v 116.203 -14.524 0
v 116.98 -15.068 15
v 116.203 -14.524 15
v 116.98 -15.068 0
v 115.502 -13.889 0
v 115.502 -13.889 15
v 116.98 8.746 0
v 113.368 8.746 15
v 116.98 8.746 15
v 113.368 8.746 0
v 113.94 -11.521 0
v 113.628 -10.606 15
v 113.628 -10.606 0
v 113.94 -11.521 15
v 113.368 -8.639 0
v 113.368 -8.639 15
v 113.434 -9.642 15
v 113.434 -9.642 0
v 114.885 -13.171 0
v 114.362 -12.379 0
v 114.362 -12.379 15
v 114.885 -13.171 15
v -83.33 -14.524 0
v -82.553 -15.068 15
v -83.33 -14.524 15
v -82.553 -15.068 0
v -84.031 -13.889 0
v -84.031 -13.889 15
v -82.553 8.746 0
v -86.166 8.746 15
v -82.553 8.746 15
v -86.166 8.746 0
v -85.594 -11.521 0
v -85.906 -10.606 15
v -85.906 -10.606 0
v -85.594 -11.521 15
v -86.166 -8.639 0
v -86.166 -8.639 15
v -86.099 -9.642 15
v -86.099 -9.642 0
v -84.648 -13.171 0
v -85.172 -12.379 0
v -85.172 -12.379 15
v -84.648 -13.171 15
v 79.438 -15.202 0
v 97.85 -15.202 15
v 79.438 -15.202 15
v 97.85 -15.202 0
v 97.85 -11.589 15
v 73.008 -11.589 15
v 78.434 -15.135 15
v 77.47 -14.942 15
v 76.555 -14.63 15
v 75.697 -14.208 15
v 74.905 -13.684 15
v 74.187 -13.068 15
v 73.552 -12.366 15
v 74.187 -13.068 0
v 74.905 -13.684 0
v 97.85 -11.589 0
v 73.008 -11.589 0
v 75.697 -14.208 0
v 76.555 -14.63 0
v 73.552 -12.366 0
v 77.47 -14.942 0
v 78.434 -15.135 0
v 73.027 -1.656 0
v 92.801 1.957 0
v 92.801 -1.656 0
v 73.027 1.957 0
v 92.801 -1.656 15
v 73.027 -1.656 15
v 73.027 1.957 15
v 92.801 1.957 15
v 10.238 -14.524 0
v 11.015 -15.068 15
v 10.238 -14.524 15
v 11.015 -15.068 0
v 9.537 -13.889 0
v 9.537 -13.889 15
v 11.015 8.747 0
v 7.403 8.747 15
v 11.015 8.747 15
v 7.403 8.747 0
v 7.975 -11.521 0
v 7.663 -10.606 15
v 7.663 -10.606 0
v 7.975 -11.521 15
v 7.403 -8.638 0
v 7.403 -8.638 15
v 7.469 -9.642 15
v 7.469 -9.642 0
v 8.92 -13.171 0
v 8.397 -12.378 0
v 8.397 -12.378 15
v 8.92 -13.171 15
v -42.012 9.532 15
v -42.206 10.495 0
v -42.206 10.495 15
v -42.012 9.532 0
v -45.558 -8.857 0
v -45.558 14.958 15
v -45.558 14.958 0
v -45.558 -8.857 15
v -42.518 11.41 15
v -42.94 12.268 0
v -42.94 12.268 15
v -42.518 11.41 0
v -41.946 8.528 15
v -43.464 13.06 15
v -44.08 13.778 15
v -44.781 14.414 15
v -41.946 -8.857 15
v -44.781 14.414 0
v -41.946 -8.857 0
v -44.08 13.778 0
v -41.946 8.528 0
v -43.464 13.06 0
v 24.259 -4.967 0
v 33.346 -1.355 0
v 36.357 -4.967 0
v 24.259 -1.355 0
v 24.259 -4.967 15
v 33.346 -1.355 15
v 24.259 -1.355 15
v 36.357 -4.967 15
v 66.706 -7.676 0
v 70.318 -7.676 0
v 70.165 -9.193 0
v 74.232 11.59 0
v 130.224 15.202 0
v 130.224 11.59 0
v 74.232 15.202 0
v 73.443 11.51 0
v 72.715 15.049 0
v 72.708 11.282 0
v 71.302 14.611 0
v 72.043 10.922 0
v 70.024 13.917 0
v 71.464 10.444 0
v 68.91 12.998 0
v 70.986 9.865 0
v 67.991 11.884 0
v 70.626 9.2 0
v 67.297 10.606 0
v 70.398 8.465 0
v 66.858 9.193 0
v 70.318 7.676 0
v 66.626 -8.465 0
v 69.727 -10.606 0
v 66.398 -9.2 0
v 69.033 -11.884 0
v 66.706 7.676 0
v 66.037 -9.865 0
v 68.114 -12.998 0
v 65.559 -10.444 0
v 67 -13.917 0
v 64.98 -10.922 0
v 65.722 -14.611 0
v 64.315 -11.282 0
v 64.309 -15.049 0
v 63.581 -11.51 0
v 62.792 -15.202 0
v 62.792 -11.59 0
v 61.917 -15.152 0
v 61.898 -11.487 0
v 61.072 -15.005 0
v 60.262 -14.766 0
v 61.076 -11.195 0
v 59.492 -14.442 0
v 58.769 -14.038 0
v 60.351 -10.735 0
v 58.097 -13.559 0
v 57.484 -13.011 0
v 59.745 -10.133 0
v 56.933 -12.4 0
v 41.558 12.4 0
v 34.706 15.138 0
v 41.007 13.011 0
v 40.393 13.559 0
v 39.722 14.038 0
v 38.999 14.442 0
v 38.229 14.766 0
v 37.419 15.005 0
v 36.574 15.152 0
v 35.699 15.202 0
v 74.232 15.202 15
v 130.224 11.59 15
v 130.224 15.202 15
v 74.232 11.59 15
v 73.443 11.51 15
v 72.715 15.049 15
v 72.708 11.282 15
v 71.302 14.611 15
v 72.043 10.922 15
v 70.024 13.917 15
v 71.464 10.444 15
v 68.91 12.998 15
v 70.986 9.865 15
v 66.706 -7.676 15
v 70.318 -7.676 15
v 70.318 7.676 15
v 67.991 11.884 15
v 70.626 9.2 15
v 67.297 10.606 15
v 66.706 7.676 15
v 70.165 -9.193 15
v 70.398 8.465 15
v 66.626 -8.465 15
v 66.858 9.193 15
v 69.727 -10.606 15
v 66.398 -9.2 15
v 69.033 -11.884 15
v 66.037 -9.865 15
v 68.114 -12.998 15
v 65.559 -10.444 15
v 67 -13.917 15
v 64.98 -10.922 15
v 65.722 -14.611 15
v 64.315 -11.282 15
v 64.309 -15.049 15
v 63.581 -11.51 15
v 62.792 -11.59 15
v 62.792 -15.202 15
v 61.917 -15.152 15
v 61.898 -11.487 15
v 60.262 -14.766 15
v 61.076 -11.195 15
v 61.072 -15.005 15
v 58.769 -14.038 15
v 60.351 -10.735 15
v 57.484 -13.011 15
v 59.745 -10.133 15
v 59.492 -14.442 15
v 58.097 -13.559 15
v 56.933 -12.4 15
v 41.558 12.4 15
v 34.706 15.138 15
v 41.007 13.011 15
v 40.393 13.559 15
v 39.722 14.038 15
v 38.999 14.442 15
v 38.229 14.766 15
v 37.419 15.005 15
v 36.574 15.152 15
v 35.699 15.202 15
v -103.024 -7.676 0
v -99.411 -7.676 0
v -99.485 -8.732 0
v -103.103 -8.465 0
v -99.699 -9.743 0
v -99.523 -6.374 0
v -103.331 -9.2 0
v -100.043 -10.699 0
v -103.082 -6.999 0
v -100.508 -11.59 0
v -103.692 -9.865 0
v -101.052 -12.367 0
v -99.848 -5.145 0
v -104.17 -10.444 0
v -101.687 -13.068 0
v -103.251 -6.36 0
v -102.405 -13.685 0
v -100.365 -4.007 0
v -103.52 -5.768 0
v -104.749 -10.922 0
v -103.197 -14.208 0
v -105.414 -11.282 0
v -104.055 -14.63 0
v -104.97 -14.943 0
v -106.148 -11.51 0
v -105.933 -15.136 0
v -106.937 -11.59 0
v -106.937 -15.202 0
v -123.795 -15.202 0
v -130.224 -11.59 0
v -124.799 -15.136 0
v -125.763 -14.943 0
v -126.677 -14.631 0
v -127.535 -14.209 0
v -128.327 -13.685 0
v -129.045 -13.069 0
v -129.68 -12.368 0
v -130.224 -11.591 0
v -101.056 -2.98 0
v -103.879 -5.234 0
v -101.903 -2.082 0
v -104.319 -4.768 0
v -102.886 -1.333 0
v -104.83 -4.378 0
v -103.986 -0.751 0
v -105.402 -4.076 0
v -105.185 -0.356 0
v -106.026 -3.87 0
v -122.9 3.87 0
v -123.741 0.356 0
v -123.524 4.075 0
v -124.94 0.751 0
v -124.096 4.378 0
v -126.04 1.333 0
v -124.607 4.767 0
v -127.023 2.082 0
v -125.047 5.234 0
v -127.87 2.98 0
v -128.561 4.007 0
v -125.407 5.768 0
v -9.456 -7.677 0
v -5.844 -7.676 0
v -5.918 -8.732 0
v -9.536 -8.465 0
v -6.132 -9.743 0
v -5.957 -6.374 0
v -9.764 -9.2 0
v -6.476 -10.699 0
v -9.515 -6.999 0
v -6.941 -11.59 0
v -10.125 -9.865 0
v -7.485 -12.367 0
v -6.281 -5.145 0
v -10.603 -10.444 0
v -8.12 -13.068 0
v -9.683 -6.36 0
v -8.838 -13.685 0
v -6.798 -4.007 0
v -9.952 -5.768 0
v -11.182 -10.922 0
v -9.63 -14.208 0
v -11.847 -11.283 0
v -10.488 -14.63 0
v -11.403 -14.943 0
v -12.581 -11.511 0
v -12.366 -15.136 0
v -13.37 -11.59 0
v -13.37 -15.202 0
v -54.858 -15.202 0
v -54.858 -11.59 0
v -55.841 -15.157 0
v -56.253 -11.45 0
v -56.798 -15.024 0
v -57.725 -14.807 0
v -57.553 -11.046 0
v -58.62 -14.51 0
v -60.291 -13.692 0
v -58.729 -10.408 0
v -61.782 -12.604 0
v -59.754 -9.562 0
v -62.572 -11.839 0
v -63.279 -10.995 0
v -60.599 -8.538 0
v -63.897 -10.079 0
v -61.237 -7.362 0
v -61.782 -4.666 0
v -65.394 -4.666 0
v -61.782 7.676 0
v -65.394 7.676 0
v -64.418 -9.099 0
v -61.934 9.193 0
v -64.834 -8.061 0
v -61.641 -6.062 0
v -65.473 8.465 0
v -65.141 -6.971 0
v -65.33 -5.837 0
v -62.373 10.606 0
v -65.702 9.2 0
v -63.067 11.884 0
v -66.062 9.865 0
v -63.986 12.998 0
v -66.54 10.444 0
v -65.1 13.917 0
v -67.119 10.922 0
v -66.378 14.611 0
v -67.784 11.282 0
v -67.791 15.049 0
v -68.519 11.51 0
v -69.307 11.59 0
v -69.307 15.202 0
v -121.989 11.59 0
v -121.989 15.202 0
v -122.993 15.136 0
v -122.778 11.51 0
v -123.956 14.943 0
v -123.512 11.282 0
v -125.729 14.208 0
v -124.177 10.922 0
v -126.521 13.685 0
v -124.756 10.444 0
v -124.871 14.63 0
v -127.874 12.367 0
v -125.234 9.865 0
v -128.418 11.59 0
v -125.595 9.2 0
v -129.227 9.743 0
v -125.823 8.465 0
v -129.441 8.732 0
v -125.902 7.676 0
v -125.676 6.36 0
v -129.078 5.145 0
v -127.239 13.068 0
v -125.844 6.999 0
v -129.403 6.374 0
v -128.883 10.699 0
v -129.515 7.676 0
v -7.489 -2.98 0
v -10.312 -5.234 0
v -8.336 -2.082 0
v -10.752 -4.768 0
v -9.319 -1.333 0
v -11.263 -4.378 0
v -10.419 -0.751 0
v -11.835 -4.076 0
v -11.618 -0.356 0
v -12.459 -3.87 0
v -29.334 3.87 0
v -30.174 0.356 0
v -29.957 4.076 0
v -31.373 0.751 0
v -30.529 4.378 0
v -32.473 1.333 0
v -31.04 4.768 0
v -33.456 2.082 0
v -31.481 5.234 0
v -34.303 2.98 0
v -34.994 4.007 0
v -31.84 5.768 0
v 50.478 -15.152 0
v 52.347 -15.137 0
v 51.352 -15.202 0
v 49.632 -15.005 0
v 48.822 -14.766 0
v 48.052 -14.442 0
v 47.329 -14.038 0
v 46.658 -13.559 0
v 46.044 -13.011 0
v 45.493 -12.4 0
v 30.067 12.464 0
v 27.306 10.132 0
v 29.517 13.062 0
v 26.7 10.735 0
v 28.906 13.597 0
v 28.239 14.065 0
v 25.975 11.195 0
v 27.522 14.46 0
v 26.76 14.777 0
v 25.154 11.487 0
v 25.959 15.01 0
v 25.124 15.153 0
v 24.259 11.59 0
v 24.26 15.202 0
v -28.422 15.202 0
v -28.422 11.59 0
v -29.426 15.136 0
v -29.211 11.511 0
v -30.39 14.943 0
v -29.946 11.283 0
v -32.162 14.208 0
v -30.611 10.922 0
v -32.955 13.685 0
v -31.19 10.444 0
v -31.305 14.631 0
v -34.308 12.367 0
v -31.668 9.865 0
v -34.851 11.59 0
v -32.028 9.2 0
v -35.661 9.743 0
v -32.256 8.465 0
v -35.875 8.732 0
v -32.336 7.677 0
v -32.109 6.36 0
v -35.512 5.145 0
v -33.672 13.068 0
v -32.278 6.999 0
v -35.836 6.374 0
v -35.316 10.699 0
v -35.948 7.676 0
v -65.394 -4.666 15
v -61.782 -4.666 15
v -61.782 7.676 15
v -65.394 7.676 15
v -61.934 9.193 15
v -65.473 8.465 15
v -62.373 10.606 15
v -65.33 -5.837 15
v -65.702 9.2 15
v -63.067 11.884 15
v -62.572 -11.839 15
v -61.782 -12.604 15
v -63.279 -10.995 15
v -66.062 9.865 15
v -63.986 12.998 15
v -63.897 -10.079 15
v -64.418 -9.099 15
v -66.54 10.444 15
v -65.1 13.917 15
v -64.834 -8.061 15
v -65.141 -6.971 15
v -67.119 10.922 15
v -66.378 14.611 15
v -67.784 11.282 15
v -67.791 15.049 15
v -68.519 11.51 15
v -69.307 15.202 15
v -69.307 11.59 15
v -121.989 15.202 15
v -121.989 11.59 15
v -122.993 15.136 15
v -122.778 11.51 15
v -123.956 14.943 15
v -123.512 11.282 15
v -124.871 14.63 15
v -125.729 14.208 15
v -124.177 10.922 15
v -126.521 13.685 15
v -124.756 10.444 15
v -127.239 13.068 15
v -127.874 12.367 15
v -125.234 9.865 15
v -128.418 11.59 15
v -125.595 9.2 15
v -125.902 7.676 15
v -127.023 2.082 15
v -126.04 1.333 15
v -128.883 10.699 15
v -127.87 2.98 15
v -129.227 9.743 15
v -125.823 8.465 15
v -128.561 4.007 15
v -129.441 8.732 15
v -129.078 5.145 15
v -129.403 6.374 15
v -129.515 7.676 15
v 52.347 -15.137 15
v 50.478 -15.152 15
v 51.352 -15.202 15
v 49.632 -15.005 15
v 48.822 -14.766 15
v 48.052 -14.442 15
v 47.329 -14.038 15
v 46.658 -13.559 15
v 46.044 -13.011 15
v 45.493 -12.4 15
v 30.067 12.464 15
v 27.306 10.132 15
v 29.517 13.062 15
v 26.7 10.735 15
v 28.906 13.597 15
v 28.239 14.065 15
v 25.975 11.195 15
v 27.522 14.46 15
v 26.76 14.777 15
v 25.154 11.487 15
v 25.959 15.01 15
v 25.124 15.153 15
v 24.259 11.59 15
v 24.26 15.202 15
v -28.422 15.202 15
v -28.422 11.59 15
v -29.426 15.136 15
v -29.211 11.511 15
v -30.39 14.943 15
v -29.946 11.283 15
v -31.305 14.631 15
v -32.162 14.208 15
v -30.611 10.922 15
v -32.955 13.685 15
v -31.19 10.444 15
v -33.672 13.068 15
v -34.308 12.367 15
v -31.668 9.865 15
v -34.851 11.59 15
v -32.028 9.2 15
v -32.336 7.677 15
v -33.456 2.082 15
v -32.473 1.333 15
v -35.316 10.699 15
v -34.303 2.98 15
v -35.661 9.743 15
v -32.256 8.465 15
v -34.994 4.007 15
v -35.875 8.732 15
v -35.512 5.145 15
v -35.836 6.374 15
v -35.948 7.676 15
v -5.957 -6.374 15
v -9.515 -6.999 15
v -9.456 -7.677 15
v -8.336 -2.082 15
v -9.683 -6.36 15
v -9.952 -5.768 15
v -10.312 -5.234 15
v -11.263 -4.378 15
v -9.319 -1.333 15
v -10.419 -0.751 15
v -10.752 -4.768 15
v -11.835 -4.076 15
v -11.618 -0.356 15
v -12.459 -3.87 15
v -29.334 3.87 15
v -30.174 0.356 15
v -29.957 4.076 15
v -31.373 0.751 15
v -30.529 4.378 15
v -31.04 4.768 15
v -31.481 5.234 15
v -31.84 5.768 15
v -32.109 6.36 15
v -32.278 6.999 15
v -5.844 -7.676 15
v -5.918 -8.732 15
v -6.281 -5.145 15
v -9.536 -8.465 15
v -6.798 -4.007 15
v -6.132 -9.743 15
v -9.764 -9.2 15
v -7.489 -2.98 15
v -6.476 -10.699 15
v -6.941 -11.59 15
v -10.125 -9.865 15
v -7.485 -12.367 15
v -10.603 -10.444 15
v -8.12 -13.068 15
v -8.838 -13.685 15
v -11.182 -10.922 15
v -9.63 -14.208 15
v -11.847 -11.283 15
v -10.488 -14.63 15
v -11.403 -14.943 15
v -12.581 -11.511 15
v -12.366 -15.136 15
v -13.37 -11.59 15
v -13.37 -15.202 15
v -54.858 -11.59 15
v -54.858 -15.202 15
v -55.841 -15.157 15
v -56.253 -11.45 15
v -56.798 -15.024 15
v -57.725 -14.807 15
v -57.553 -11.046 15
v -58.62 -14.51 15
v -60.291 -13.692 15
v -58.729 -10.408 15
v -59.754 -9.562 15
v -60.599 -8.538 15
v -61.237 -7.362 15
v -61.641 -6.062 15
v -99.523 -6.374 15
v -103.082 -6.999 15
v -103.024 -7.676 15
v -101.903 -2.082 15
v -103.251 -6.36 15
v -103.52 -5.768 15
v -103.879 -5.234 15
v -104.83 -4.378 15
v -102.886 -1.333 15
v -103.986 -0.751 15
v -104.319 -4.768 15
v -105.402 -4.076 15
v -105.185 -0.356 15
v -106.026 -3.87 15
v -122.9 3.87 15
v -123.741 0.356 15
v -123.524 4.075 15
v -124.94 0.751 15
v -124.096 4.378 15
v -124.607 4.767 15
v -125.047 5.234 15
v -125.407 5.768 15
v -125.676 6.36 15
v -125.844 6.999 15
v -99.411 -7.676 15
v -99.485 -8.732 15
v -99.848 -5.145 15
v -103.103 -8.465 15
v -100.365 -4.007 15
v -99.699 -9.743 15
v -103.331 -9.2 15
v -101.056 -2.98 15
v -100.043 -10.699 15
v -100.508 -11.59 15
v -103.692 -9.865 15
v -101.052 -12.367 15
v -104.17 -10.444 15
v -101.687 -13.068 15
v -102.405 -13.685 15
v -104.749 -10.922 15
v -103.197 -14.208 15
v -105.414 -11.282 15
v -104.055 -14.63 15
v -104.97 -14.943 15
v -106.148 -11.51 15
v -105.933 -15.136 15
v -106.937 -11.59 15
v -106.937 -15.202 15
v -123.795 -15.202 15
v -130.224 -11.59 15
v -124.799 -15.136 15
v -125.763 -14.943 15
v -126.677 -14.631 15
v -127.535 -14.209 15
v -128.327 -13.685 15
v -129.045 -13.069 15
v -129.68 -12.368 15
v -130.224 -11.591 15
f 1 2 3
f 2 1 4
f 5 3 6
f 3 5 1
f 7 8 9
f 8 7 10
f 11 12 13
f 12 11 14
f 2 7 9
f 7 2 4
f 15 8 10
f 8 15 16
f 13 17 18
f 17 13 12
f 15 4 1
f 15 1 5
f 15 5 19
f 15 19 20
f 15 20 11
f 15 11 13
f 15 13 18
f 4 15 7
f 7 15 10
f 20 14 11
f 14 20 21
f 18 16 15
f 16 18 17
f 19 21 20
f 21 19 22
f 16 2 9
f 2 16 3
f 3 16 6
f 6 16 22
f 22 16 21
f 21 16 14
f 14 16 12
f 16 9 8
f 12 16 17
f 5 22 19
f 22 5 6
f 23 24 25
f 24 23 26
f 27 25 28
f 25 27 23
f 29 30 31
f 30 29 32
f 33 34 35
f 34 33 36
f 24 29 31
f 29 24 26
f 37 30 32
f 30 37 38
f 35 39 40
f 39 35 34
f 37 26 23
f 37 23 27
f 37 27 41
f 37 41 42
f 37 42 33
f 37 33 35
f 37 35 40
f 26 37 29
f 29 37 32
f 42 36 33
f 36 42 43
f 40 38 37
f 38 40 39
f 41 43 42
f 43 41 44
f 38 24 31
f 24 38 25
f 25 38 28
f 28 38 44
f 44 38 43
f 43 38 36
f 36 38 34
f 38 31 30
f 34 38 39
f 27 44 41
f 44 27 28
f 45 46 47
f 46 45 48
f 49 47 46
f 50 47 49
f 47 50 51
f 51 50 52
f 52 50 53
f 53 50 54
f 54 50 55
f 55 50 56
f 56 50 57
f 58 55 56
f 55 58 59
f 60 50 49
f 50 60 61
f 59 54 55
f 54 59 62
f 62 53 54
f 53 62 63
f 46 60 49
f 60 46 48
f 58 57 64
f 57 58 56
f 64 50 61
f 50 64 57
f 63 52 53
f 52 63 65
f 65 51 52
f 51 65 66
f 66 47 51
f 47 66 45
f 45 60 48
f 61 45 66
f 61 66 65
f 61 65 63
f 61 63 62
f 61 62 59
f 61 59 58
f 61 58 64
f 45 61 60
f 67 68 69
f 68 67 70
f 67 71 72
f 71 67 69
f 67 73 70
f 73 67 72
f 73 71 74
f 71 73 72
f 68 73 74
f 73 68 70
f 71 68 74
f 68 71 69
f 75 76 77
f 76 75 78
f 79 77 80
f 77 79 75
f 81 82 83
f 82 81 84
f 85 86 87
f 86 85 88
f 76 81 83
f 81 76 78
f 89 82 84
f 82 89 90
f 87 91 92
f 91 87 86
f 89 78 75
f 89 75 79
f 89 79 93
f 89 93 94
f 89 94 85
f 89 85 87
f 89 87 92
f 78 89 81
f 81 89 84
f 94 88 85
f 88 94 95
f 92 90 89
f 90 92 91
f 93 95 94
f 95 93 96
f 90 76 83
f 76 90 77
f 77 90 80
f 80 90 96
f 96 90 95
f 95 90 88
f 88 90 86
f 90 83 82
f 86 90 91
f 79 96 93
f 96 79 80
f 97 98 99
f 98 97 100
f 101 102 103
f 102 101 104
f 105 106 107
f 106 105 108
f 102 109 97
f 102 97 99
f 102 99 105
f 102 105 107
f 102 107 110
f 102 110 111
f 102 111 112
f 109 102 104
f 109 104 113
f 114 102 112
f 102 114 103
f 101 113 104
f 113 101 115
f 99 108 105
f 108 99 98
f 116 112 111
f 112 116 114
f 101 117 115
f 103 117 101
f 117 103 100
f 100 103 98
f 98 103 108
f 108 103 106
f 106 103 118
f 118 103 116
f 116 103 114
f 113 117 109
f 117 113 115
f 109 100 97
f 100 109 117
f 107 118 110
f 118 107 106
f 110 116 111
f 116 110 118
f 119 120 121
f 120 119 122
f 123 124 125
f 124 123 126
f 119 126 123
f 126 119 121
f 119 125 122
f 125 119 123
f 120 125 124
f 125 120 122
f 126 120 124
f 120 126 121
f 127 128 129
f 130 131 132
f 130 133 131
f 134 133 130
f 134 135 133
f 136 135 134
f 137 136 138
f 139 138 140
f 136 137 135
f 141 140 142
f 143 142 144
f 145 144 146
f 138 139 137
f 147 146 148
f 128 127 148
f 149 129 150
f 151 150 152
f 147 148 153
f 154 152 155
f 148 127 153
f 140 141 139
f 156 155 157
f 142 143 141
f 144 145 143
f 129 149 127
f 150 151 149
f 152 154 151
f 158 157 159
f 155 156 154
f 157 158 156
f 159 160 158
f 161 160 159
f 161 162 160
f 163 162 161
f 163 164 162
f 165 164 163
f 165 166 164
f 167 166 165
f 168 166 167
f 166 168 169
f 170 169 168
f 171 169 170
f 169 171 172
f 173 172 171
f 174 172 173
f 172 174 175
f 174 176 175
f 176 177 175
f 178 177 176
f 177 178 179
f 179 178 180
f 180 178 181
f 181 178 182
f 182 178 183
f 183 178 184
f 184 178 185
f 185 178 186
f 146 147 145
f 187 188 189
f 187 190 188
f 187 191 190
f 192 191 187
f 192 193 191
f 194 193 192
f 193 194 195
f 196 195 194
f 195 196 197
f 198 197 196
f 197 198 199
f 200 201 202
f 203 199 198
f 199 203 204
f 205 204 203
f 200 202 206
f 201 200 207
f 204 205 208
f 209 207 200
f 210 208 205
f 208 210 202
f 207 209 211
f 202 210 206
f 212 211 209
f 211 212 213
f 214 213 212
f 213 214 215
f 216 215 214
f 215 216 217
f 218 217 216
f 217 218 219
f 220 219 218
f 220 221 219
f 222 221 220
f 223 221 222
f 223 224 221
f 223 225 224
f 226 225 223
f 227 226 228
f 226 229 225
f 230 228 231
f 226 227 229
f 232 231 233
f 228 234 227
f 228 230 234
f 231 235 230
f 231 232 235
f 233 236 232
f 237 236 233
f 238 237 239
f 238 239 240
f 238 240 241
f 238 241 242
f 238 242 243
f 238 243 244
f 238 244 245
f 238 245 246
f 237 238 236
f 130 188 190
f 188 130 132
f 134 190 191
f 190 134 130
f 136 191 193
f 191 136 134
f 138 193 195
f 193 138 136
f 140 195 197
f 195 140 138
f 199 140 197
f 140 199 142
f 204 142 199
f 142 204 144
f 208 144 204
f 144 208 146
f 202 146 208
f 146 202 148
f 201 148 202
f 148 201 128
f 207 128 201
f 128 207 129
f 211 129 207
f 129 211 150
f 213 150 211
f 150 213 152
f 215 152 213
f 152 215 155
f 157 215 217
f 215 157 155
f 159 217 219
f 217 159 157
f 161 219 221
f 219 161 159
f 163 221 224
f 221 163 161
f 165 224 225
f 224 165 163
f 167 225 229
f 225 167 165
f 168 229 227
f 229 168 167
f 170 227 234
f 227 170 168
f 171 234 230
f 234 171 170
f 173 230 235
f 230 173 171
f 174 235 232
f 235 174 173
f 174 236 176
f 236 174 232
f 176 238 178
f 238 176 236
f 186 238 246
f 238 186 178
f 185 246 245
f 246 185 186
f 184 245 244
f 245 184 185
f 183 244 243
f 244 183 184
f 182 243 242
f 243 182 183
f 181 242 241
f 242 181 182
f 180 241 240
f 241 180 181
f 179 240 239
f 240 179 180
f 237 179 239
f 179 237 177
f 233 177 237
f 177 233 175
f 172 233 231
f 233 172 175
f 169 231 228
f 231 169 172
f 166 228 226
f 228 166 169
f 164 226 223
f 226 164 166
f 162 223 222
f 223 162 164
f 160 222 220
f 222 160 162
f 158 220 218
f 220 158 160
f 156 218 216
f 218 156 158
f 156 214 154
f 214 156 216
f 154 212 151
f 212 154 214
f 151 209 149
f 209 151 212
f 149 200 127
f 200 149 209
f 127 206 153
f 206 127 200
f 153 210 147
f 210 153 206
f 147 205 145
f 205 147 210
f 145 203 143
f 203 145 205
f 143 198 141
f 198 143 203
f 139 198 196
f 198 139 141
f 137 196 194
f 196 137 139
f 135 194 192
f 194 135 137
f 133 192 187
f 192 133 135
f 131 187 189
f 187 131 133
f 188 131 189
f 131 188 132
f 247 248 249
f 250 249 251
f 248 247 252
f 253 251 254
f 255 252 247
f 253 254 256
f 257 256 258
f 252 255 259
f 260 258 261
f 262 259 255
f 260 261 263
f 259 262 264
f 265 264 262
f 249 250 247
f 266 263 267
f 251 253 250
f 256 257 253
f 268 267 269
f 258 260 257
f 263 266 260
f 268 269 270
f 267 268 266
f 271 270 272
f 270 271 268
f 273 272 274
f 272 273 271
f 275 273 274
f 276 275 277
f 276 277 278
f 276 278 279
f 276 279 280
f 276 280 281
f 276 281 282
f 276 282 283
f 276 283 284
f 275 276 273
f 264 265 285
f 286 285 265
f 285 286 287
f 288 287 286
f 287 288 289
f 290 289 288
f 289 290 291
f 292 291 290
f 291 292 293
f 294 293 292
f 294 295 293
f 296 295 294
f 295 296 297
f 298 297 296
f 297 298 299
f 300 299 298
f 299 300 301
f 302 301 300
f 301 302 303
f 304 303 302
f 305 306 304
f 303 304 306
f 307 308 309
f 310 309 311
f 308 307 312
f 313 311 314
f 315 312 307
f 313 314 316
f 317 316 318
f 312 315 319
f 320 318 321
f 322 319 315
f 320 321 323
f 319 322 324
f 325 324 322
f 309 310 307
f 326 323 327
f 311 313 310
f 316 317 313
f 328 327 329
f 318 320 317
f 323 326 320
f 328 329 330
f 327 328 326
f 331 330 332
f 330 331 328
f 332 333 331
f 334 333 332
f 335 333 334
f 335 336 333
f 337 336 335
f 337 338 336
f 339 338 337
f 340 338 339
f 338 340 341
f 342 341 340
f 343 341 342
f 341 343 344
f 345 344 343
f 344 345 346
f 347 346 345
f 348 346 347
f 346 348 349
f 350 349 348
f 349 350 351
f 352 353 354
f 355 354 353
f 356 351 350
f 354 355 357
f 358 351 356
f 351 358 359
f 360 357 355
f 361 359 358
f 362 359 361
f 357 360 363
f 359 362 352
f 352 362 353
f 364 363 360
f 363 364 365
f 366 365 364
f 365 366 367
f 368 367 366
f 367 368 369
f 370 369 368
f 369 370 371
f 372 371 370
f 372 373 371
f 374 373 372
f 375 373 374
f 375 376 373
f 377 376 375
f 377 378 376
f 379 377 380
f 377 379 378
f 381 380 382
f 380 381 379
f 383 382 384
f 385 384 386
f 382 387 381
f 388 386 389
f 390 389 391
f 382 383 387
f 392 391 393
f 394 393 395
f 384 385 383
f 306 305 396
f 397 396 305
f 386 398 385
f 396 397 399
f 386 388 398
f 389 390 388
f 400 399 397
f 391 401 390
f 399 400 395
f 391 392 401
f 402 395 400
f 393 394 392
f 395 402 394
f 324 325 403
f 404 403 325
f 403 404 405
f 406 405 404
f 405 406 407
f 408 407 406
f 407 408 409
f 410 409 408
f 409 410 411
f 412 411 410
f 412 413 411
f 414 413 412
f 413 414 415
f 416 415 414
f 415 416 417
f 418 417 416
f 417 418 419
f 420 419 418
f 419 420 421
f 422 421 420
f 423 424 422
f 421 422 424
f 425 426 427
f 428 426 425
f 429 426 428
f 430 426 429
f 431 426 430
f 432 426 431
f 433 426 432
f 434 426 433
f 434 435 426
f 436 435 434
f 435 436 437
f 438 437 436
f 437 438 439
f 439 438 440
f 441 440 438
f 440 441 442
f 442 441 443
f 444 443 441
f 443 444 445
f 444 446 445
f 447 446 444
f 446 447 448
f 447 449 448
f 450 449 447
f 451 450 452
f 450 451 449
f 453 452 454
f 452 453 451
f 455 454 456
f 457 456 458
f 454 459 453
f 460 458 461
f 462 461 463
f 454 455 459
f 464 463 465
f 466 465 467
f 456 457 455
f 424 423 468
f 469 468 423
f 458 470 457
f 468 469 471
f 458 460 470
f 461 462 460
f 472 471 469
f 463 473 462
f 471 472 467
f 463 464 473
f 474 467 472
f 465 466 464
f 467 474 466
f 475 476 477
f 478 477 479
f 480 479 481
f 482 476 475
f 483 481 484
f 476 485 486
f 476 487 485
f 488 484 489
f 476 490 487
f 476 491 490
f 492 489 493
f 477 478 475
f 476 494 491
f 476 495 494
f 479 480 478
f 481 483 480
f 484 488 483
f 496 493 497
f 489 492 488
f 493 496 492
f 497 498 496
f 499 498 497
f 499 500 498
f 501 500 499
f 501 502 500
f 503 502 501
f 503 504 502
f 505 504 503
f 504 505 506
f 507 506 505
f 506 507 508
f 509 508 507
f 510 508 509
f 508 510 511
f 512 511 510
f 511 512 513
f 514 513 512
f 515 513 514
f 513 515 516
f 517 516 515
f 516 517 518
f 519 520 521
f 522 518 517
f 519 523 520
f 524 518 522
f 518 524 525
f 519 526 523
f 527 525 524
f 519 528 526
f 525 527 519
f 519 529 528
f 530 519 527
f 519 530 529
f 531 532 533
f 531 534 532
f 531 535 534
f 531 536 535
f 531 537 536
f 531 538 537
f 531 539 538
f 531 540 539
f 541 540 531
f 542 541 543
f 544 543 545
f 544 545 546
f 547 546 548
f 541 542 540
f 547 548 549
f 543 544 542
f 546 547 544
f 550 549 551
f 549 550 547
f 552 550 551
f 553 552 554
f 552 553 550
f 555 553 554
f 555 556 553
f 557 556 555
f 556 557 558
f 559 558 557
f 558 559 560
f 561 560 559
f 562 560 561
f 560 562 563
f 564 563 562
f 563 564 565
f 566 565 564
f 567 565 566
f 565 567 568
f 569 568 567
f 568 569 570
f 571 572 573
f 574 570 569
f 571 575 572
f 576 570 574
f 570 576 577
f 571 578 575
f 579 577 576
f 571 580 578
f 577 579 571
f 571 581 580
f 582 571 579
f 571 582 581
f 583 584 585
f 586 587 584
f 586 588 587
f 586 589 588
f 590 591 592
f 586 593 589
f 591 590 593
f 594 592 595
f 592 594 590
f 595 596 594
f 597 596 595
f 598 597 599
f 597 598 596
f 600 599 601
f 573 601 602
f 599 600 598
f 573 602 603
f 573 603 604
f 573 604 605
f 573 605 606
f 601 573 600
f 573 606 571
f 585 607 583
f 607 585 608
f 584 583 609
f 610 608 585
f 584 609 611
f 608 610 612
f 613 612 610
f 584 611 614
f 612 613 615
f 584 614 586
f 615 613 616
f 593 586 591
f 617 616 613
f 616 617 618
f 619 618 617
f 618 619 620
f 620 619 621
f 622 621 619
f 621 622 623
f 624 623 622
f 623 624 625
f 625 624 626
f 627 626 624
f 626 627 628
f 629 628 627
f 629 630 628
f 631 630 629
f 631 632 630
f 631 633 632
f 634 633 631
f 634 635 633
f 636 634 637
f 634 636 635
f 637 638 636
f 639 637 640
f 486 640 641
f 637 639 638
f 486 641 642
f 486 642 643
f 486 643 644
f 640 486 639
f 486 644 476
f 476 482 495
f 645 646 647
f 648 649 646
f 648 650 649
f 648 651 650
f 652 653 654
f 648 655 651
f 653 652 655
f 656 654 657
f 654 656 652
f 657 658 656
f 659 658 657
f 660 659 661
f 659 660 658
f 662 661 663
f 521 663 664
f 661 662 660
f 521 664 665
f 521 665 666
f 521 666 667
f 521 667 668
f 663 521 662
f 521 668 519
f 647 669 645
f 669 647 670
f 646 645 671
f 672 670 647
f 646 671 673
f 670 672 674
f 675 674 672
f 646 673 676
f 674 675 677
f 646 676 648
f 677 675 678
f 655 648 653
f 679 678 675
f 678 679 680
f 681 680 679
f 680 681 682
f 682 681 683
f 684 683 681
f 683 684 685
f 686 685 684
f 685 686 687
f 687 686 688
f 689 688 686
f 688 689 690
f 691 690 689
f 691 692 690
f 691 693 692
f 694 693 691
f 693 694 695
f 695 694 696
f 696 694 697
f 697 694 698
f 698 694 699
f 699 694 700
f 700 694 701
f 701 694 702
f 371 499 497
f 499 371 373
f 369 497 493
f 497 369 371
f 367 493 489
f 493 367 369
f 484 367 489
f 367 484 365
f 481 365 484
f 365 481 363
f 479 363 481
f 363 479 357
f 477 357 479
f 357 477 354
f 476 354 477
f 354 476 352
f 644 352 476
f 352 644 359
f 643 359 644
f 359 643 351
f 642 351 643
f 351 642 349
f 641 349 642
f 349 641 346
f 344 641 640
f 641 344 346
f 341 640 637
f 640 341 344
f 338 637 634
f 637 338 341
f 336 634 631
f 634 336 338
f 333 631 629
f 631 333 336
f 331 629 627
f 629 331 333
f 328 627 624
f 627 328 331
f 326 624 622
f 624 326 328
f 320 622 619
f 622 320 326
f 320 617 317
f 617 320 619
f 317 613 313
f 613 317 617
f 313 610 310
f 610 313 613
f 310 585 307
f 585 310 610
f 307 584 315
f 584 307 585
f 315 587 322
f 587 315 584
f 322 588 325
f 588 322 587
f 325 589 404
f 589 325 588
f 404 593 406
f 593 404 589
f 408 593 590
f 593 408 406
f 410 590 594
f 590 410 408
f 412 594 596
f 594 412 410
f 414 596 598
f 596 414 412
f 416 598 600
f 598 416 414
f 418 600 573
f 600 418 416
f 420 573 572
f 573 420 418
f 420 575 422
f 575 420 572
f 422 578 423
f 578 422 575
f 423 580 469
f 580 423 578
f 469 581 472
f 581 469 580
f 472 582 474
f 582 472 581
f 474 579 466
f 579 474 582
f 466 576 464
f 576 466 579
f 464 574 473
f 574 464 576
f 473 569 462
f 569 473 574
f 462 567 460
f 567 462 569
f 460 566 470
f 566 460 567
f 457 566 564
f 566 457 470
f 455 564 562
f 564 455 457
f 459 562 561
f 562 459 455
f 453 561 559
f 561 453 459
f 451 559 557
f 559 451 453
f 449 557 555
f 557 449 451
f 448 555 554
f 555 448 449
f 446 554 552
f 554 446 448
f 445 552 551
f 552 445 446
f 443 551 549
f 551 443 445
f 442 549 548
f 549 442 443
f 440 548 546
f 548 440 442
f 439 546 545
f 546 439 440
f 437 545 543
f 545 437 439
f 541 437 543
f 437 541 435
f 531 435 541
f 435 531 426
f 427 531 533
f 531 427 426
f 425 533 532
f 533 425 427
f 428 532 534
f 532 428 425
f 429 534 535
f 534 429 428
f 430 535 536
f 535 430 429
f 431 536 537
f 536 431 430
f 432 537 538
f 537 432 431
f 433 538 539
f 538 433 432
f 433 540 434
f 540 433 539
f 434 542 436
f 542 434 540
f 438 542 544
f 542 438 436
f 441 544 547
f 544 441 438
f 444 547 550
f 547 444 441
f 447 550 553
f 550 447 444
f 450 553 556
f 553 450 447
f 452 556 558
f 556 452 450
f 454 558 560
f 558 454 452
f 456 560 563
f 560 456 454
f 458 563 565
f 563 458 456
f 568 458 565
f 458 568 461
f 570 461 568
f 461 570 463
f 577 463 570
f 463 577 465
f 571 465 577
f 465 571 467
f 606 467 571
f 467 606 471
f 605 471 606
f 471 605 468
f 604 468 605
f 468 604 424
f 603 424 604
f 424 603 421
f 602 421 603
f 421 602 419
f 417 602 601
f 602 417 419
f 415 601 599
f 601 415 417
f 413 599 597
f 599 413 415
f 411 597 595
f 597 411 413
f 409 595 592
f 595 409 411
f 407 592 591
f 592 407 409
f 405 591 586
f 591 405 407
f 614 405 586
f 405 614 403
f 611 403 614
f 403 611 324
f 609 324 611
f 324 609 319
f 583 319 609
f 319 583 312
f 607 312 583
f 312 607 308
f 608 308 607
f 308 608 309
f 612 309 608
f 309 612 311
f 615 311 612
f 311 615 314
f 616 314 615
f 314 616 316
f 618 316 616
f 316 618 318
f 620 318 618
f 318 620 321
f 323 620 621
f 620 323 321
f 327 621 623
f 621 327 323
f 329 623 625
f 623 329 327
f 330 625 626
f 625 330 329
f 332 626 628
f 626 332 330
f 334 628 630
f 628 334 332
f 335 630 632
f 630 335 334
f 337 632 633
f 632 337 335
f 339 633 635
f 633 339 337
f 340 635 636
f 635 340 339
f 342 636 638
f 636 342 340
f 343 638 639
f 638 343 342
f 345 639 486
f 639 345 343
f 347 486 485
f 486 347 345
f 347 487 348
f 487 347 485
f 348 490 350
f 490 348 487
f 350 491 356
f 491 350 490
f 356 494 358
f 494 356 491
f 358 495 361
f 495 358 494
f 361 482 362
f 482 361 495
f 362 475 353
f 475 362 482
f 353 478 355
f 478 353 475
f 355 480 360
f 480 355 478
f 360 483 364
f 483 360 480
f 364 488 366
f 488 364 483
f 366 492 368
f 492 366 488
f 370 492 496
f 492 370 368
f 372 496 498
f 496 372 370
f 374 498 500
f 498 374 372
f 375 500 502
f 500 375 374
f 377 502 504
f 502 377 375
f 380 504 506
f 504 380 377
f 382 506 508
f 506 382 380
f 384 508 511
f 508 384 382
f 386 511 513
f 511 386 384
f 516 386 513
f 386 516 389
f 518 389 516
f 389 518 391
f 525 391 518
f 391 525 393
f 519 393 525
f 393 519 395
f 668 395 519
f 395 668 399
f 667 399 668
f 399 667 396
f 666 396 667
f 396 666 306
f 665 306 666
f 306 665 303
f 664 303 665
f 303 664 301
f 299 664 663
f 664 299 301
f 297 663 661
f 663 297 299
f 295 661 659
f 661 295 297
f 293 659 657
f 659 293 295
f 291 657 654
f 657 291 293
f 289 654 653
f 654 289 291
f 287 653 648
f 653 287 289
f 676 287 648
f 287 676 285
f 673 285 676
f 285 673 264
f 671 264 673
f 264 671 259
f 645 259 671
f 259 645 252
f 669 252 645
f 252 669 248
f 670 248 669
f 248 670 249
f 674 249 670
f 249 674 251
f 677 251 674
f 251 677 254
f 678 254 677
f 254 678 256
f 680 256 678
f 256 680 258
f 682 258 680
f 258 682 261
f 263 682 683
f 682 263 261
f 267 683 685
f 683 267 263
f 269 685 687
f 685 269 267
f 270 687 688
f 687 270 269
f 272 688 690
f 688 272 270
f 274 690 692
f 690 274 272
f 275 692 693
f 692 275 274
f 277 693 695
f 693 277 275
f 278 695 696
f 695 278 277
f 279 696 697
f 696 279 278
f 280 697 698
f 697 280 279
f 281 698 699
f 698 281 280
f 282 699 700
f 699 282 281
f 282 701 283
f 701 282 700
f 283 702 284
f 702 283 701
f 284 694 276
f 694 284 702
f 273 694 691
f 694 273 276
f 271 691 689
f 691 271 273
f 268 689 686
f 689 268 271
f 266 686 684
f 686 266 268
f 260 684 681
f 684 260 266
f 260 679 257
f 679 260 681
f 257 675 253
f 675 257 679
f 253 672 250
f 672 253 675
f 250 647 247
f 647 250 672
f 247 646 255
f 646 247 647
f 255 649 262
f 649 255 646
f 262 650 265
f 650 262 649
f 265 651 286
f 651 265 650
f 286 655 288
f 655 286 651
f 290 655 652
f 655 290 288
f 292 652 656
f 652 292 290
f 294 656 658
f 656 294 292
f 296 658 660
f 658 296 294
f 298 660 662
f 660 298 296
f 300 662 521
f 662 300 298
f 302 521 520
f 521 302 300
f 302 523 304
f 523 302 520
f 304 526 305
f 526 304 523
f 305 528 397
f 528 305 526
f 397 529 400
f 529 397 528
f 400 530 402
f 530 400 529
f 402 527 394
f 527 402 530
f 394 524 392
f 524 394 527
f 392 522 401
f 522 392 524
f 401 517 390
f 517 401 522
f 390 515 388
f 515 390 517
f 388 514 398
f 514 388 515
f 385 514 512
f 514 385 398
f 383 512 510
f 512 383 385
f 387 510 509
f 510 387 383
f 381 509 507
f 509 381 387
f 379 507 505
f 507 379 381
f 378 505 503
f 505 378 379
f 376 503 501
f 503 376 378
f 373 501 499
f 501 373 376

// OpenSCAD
// Module names are of the form poly_<inkscape-path-id>().  As a result,
// you can associate a polygon in this OpenSCAD program with the corresponding
// SVG element in the Inkscape document by looking for the XML element with
// the attribute id="inkscape-path-id".

// fudge value is used to ensure that subtracted solids are a tad taller
// in the z dimension than the polygon being subtracted from.  This helps
// keep the resulting .stl file manifold.
fudge = 0.1;

module poly_path75(h)
{
  scale([25.4/90, -25.4/90, 1]) union()
  {
    linear_extrude(height=h)
      polygon([[414.497196,53.392017],[411.743727,51.464387],[409.259445,49.213582],[407.074538,46.669727],[405.219193,43.862947],[403.723599,40.823367],[402.617942,37.581112],[401.932411,34.166307],[401.697192,30.609076],[401.697192,-30.990943],[414.497196,-30.990943],[414.497196,53.388817]]);
  }
}

module poly_path85(h)
{
  scale([25.4/90, -25.4/90, 1]) union()
  {
    linear_extrude(height=h)
      polygon([[-292.511025,53.392017],[-295.264801,51.464387],[-297.749226,49.213582],[-299.934152,46.669727],[-301.789428,43.862947],[-303.284903,40.823367],[-304.390428,37.581112],[-305.075854,34.166307],[-305.311029,30.609076],[-305.311029,-30.990943],[-292.511025,-30.990943],[-292.511025,53.388817]]);
  }
}

module poly_path77(h)
{
  scale([25.4/90, -25.4/90, 1]) union()
  {
    linear_extrude(height=h)
      polygon([[258.689148,41.064546],[260.616777,43.818016],[262.867582,46.302298],[265.411437,48.487205],[268.218217,50.342549],[271.257797,51.838143],[274.500052,52.943800],[277.914858,53.629331],[281.472088,53.864550],[346.713708,53.864550],[346.713708,41.064546],[258.691281,41.064546]]);
  }
}

module poly_polygon11(h)
{
  scale([25.4/90, -25.4/90, 1]) union()
  {
    linear_extrude(height=h)
      polygon([[-99.016564,-69.866688],[14.137604,69.866688],[128.138707,69.866688],[14.984538,-69.866688]]);
  }
}

module poly_rect71(h)
{
  scale([25.4/90, -25.4/90, 1]) union()
  {
    linear_extrude(height=h)
      polygon([[258.758481,-6.933335],[328.822501,-6.933335],[328.822501,5.866669],[258.758481,5.866669]]);
  }
}

module poly_polygon13(h)
{
  scale([25.4/90, -25.4/90, 1]) union()
  {
    linear_extrude(height=h)
      polygon([[-237.684341,-69.866688],[-124.532306,69.866688],[-10.526937,69.866688],[-123.678972,-69.866688]]);
  }
}

module poly_path87(h)
{
  scale([25.4/90, -25.4/90, 1]) union()
  {
    linear_extrude(height=h)
      polygon([[39.030412,53.389883],[36.276943,51.462254],[33.792661,49.211449],[31.607754,46.667594],[29.752409,43.860814],[28.256815,40.821234],[27.151158,37.578978],[26.465627,34.164173],[26.230408,30.606943],[26.230408,-30.993076],[39.030412,-30.993076],[39.030412,53.386683]]);
  }
}

module poly_path89(h)
{
  scale([25.4/90, -25.4/90, 1]) union()
  {
    linear_extrude(height=h)
      polygon([[-161.427250,-52.999483],[-158.673781,-51.071853],[-156.189499,-48.821049],[-154.004592,-46.277194],[-152.149248,-43.470414],[-150.653653,-40.430833],[-149.547997,-37.188578],[-148.862465,-33.773773],[-148.627246,-30.216543],[-148.627246,31.383476],[-161.427250,31.383476],[-161.427250,-52.996283]]);
  }
}

module poly_polygon7(h)
{
  scale([25.4/90, -25.4/90, 1]) union()
  {
    linear_extrude(height=h)
      polygon([[178.318989,-69.866688],[291.472091,69.866688],[405.471060,69.866688],[292.316891,-69.866688]]);
  }
}

module poly_polygon81(h)
{
  scale([25.4/90, -25.4/90, 1]) union()
  {
    linear_extrude(height=h)
      polygon([[85.958427,4.800002],[118.155770,4.800002],[128.822440,17.600006],[85.958427,17.600006]]);
  }
}

module poly_path73(h)
{
  scale([25.4/90, -25.4/90, 1]) union()
  {
    linear_extrude(height=h)
      polygon([[461.425211,-41.066679],[461.425211,-53.866684],[354.758511,-53.866684],[263.025149,-53.866684],[257.650614,-53.324906],[252.644879,-51.771066],[248.115144,-49.312401],[244.168610,-46.056148],[240.912475,-42.109544],[238.453941,-37.579828],[236.900207,-32.574237],[236.358474,-27.200009],[236.358474,27.200008],[236.076765,29.994718],[235.268807,32.597677],[233.990348,34.953136],[232.297139,37.005345],[230.244930,38.698554],[227.889471,39.977012],[225.286512,40.784971],[222.491803,41.066680],[219.322519,40.702646],[216.411934,39.665612],[213.842350,38.038179],[211.696066,35.902945],[147.253379,-43.937080],[147.252313,-43.937080],[145.300808,-46.102631],[143.125878,-48.043682],[140.747298,-49.740432],[138.184843,-51.173083],[135.458288,-52.321833],[132.587408,-53.166883],[129.591978,-53.688433],[126.491773,-53.866684],[122.973905,-53.637350],[201.730196,43.936014],[201.730196,43.937080],[203.681791,46.102279],[205.856948,48.043065],[208.235830,49.739626],[210.798599,51.172149],[213.525419,52.320823],[216.396451,53.165833],[219.391858,53.687369],[222.491803,53.865617],[227.866032,53.323840],[232.871623,51.770000],[237.401339,49.311334],[241.347942,46.055081],[244.604195,42.108478],[247.062861,37.578762],[248.616701,32.573171],[249.158478,27.198942],[249.158478,-27.200009],[249.440186,-29.994718],[250.248145,-32.597677],[251.526604,-34.953136],[253.219812,-37.005345],[255.272021,-38.698554],[257.627481,-39.977012],[260.230440,-40.784971],[263.025149,-41.066679],[354.956911,-41.066679]]);
  }
}

module poly_polygon9(h)
{
  scale([25.4/90, -25.4/90, 1]) union()
  {
    linear_extrude(height=h)
      polygon([[39.651212,-69.866688],[152.805381,69.866688],[266.804350,69.866688],[153.651248,-69.866688]]);
  }
}

module poly_path83(h)
{
  scale([25.4/90, -25.4/90, 1]) union()
  {
    linear_extrude(height=h)
      polygon([[185.480591,53.636283],[106.535500,-44.162147],[104.586981,-46.280971],[102.422149,-48.179132],[100.060092,-49.837568],[97.519897,-51.237216],[94.820653,-52.359014],[91.981445,-53.183900],[89.021363,-53.692811],[85.959494,-53.866684],[-3.485868,-53.866684],[-100.708298,-53.866684],[-104.265218,-53.631508],[-107.679850,-52.946083],[-110.922008,-51.840558],[-113.961502,-50.345082],[-116.768147,-48.489807],[-119.311754,-46.304881],[-121.562136,-43.820455],[-123.489105,-41.066679],[-125.136222,-37.909712],[-126.356439,-34.522944],[-127.114456,-30.941376],[-127.374973,-27.200009],[-126.977142,-22.585474],[-125.828323,-18.228939],[-123.995528,-14.197404],[-121.545771,-10.557870],[-118.546064,-7.377336],[-115.063419,-4.722801],[-111.164849,-2.661267],[-106.917367,-1.259734],[-44.145080,13.712004],[-41.936234,14.440800],[-39.908912,15.512772],[-38.097941,16.893093],[-36.538145,18.546939],[-35.264349,20.439486],[-34.311377,22.535907],[-33.714056,24.801379],[-33.507210,27.201075],[-33.788919,29.995784],[-34.596877,32.598744],[-35.875336,34.954203],[-37.568545,37.006412],[-39.620754,38.699620],[-41.976213,39.978079],[-44.579172,40.786038],[-47.373881,41.067746],[-194.377661,41.067746],[-199.321816,40.569336],[-203.926897,39.139862],[-208.094228,36.877964],[-211.725133,33.882277],[-214.720938,30.251441],[-216.982968,26.084091],[-218.412547,21.478867],[-218.911002,16.534405],[-218.911002,-27.200009],[-219.452779,-32.574237],[-221.006619,-37.579828],[-223.465284,-42.109544],[-226.721538,-46.056148],[-230.668141,-49.312401],[-235.197857,-51.771066],[-240.203448,-53.324906],[-245.577677,-53.866684],[-432.244402,-53.866684],[-435.801234,-53.631465],[-439.215654,-52.945933],[-442.457549,-51.840277],[-445.496806,-50.344682],[-448.303313,-48.489338],[-450.846958,-46.304431],[-453.097627,-43.820149],[-455.025209,-41.066679],[-456.672326,-37.909712],[-457.892543,-34.522944],[-458.650560,-30.941376],[-458.911077,-27.200009],[-458.513289,-22.585474],[-457.364576,-18.228939],[-455.531913,-14.197404],[-453.082275,-10.557870],[-450.082636,-7.377336],[-446.599973,-4.722801],[-442.701259,-2.661267],[-438.453470,-1.259734],[-375.681184,13.712004],[-373.472690,14.440755],[-371.445633,15.512605],[-369.634851,16.892755],[-368.075182,18.546406],[-366.801463,20.438756],[-365.848531,22.535007],[-365.251225,24.800358],[-365.044381,27.200008],[-365.326089,29.994718],[-366.134048,32.597677],[-367.412506,34.953136],[-369.105715,37.005345],[-371.157924,38.698554],[-373.513383,39.977012],[-376.116343,40.784971],[-378.911052,41.066680],[-461.425211,41.066680],[-461.424144,41.069880],[-459.496871,43.822905],[-457.246360,46.306681],[-454.702773,48.491057],[-451.896275,50.345882],[-448.857026,51.841008],[-445.615189,52.946283],[-442.200928,53.631558],[-438.644404,53.866684],[-378.911052,53.866684],[-375.354176,53.631465],[-371.939650,52.945933],[-368.697624,51.840277],[-365.658248,50.344682],[-362.851672,48.489338],[-360.308046,46.304431],[-358.057520,43.820149],[-356.130245,41.066680],[-354.483127,37.909712],[-353.262910,34.522944],[-352.504893,30.941376],[-352.244377,27.200008],[-352.642164,22.585474],[-353.790877,18.228939],[-355.623540,14.197404],[-358.073179,10.557870],[-361.072817,7.377336],[-364.555481,4.722801],[-368.454194,2.661267],[-372.701983,1.259734],[-435.473203,-13.710938],[-437.682356,-14.440040],[-439.709821,-15.512155],[-441.520811,-16.892495],[-443.080538,-18.546272],[-444.354216,-20.438700],[-445.307056,-22.534990],[-445.904271,-24.800356],[-446.111073,-27.200009],[-445.829364,-29.994718],[-445.021406,-32.597677],[-443.742947,-34.953136],[-442.049738,-37.005345],[-439.997529,-38.698554],[-437.642070,-39.977012],[-435.039111,-40.784971],[-432.244402,-41.066679],[-245.577677,-41.066679],[-242.782968,-40.784971],[-240.180008,-39.977012],[-237.824549,-38.698554],[-235.772340,-37.005345],[-234.079131,-34.953136],[-232.800673,-32.597677],[-231.992714,-29.994718],[-231.711006,-27.200009],[-231.711006,16.533338],[-231.482568,20.683934],[-230.813505,24.701291],[-229.728193,28.561374],[-228.251005,32.240143],[-226.406317,35.713563],[-224.218503,38.957596],[-221.711940,41.948203],[-218.911002,44.661347],[-213.630917,48.516182],[-207.707132,51.412016],[-204.538945,52.464371],[-201.251946,53.233850],[-197.860172,53.706079],[-194.377661,53.866684],[-47.374948,53.866684],[-43.818072,53.631465],[-40.403546,52.945933],[-37.161520,51.840277],[-34.122144,50.344682],[-31.315568,48.489338],[-28.771942,46.304431],[-26.521417,43.820149],[-24.594141,41.066680],[-22.947024,37.909712],[-21.726807,34.522944],[-20.968790,30.941376],[-20.708273,27.200008],[-21.106061,22.585474],[-22.254774,18.228939],[-24.087437,14.197404],[-26.537075,10.557870],[-29.536713,7.377336],[-33.019377,4.722801],[-36.918091,2.661267],[-41.165880,1.259734],[-103.938166,-13.712004],[-106.147319,-14.440800],[-108.174784,-15.512772],[-109.985774,-16.893093],[-111.545502,-18.546939],[-112.819179,-20.439486],[-113.772019,-22.535907],[-114.369234,-24.801379],[-114.576036,-27.201075],[-114.294327,-29.995784],[-113.486369,-32.598744],[-112.207910,-34.954203],[-110.514701,-37.006412],[-108.462492,-38.699620],[-106.107033,-39.978079],[-103.504074,-40.786038],[-100.709365,-41.067746],[85.958427,-41.067746],[89.128145,-40.703513],[92.038562,-39.665879],[94.607580,-38.037445],[96.753097,-35.900811],[161.195784,43.937080],[163.147378,46.102279],[165.322535,48.043065],[167.701417,49.739626],[170.264187,51.172149],[172.991006,52.320823],[175.862038,53.165833],[178.857445,53.687369],[181.957390,53.865617],[185.480591,53.636283]]);
  }
}

poly_path75(15);
poly_path85(15);
poly_path77(15);
//poly_polygon11(15);
poly_rect71(15);
//poly_polygon13(15);
poly_path87(15);
poly_path89(15);
//poly_polygon7(15);
poly_polygon81(15);
poly_path73(15);
//poly_polygon9(15);
poly_path83(15);
